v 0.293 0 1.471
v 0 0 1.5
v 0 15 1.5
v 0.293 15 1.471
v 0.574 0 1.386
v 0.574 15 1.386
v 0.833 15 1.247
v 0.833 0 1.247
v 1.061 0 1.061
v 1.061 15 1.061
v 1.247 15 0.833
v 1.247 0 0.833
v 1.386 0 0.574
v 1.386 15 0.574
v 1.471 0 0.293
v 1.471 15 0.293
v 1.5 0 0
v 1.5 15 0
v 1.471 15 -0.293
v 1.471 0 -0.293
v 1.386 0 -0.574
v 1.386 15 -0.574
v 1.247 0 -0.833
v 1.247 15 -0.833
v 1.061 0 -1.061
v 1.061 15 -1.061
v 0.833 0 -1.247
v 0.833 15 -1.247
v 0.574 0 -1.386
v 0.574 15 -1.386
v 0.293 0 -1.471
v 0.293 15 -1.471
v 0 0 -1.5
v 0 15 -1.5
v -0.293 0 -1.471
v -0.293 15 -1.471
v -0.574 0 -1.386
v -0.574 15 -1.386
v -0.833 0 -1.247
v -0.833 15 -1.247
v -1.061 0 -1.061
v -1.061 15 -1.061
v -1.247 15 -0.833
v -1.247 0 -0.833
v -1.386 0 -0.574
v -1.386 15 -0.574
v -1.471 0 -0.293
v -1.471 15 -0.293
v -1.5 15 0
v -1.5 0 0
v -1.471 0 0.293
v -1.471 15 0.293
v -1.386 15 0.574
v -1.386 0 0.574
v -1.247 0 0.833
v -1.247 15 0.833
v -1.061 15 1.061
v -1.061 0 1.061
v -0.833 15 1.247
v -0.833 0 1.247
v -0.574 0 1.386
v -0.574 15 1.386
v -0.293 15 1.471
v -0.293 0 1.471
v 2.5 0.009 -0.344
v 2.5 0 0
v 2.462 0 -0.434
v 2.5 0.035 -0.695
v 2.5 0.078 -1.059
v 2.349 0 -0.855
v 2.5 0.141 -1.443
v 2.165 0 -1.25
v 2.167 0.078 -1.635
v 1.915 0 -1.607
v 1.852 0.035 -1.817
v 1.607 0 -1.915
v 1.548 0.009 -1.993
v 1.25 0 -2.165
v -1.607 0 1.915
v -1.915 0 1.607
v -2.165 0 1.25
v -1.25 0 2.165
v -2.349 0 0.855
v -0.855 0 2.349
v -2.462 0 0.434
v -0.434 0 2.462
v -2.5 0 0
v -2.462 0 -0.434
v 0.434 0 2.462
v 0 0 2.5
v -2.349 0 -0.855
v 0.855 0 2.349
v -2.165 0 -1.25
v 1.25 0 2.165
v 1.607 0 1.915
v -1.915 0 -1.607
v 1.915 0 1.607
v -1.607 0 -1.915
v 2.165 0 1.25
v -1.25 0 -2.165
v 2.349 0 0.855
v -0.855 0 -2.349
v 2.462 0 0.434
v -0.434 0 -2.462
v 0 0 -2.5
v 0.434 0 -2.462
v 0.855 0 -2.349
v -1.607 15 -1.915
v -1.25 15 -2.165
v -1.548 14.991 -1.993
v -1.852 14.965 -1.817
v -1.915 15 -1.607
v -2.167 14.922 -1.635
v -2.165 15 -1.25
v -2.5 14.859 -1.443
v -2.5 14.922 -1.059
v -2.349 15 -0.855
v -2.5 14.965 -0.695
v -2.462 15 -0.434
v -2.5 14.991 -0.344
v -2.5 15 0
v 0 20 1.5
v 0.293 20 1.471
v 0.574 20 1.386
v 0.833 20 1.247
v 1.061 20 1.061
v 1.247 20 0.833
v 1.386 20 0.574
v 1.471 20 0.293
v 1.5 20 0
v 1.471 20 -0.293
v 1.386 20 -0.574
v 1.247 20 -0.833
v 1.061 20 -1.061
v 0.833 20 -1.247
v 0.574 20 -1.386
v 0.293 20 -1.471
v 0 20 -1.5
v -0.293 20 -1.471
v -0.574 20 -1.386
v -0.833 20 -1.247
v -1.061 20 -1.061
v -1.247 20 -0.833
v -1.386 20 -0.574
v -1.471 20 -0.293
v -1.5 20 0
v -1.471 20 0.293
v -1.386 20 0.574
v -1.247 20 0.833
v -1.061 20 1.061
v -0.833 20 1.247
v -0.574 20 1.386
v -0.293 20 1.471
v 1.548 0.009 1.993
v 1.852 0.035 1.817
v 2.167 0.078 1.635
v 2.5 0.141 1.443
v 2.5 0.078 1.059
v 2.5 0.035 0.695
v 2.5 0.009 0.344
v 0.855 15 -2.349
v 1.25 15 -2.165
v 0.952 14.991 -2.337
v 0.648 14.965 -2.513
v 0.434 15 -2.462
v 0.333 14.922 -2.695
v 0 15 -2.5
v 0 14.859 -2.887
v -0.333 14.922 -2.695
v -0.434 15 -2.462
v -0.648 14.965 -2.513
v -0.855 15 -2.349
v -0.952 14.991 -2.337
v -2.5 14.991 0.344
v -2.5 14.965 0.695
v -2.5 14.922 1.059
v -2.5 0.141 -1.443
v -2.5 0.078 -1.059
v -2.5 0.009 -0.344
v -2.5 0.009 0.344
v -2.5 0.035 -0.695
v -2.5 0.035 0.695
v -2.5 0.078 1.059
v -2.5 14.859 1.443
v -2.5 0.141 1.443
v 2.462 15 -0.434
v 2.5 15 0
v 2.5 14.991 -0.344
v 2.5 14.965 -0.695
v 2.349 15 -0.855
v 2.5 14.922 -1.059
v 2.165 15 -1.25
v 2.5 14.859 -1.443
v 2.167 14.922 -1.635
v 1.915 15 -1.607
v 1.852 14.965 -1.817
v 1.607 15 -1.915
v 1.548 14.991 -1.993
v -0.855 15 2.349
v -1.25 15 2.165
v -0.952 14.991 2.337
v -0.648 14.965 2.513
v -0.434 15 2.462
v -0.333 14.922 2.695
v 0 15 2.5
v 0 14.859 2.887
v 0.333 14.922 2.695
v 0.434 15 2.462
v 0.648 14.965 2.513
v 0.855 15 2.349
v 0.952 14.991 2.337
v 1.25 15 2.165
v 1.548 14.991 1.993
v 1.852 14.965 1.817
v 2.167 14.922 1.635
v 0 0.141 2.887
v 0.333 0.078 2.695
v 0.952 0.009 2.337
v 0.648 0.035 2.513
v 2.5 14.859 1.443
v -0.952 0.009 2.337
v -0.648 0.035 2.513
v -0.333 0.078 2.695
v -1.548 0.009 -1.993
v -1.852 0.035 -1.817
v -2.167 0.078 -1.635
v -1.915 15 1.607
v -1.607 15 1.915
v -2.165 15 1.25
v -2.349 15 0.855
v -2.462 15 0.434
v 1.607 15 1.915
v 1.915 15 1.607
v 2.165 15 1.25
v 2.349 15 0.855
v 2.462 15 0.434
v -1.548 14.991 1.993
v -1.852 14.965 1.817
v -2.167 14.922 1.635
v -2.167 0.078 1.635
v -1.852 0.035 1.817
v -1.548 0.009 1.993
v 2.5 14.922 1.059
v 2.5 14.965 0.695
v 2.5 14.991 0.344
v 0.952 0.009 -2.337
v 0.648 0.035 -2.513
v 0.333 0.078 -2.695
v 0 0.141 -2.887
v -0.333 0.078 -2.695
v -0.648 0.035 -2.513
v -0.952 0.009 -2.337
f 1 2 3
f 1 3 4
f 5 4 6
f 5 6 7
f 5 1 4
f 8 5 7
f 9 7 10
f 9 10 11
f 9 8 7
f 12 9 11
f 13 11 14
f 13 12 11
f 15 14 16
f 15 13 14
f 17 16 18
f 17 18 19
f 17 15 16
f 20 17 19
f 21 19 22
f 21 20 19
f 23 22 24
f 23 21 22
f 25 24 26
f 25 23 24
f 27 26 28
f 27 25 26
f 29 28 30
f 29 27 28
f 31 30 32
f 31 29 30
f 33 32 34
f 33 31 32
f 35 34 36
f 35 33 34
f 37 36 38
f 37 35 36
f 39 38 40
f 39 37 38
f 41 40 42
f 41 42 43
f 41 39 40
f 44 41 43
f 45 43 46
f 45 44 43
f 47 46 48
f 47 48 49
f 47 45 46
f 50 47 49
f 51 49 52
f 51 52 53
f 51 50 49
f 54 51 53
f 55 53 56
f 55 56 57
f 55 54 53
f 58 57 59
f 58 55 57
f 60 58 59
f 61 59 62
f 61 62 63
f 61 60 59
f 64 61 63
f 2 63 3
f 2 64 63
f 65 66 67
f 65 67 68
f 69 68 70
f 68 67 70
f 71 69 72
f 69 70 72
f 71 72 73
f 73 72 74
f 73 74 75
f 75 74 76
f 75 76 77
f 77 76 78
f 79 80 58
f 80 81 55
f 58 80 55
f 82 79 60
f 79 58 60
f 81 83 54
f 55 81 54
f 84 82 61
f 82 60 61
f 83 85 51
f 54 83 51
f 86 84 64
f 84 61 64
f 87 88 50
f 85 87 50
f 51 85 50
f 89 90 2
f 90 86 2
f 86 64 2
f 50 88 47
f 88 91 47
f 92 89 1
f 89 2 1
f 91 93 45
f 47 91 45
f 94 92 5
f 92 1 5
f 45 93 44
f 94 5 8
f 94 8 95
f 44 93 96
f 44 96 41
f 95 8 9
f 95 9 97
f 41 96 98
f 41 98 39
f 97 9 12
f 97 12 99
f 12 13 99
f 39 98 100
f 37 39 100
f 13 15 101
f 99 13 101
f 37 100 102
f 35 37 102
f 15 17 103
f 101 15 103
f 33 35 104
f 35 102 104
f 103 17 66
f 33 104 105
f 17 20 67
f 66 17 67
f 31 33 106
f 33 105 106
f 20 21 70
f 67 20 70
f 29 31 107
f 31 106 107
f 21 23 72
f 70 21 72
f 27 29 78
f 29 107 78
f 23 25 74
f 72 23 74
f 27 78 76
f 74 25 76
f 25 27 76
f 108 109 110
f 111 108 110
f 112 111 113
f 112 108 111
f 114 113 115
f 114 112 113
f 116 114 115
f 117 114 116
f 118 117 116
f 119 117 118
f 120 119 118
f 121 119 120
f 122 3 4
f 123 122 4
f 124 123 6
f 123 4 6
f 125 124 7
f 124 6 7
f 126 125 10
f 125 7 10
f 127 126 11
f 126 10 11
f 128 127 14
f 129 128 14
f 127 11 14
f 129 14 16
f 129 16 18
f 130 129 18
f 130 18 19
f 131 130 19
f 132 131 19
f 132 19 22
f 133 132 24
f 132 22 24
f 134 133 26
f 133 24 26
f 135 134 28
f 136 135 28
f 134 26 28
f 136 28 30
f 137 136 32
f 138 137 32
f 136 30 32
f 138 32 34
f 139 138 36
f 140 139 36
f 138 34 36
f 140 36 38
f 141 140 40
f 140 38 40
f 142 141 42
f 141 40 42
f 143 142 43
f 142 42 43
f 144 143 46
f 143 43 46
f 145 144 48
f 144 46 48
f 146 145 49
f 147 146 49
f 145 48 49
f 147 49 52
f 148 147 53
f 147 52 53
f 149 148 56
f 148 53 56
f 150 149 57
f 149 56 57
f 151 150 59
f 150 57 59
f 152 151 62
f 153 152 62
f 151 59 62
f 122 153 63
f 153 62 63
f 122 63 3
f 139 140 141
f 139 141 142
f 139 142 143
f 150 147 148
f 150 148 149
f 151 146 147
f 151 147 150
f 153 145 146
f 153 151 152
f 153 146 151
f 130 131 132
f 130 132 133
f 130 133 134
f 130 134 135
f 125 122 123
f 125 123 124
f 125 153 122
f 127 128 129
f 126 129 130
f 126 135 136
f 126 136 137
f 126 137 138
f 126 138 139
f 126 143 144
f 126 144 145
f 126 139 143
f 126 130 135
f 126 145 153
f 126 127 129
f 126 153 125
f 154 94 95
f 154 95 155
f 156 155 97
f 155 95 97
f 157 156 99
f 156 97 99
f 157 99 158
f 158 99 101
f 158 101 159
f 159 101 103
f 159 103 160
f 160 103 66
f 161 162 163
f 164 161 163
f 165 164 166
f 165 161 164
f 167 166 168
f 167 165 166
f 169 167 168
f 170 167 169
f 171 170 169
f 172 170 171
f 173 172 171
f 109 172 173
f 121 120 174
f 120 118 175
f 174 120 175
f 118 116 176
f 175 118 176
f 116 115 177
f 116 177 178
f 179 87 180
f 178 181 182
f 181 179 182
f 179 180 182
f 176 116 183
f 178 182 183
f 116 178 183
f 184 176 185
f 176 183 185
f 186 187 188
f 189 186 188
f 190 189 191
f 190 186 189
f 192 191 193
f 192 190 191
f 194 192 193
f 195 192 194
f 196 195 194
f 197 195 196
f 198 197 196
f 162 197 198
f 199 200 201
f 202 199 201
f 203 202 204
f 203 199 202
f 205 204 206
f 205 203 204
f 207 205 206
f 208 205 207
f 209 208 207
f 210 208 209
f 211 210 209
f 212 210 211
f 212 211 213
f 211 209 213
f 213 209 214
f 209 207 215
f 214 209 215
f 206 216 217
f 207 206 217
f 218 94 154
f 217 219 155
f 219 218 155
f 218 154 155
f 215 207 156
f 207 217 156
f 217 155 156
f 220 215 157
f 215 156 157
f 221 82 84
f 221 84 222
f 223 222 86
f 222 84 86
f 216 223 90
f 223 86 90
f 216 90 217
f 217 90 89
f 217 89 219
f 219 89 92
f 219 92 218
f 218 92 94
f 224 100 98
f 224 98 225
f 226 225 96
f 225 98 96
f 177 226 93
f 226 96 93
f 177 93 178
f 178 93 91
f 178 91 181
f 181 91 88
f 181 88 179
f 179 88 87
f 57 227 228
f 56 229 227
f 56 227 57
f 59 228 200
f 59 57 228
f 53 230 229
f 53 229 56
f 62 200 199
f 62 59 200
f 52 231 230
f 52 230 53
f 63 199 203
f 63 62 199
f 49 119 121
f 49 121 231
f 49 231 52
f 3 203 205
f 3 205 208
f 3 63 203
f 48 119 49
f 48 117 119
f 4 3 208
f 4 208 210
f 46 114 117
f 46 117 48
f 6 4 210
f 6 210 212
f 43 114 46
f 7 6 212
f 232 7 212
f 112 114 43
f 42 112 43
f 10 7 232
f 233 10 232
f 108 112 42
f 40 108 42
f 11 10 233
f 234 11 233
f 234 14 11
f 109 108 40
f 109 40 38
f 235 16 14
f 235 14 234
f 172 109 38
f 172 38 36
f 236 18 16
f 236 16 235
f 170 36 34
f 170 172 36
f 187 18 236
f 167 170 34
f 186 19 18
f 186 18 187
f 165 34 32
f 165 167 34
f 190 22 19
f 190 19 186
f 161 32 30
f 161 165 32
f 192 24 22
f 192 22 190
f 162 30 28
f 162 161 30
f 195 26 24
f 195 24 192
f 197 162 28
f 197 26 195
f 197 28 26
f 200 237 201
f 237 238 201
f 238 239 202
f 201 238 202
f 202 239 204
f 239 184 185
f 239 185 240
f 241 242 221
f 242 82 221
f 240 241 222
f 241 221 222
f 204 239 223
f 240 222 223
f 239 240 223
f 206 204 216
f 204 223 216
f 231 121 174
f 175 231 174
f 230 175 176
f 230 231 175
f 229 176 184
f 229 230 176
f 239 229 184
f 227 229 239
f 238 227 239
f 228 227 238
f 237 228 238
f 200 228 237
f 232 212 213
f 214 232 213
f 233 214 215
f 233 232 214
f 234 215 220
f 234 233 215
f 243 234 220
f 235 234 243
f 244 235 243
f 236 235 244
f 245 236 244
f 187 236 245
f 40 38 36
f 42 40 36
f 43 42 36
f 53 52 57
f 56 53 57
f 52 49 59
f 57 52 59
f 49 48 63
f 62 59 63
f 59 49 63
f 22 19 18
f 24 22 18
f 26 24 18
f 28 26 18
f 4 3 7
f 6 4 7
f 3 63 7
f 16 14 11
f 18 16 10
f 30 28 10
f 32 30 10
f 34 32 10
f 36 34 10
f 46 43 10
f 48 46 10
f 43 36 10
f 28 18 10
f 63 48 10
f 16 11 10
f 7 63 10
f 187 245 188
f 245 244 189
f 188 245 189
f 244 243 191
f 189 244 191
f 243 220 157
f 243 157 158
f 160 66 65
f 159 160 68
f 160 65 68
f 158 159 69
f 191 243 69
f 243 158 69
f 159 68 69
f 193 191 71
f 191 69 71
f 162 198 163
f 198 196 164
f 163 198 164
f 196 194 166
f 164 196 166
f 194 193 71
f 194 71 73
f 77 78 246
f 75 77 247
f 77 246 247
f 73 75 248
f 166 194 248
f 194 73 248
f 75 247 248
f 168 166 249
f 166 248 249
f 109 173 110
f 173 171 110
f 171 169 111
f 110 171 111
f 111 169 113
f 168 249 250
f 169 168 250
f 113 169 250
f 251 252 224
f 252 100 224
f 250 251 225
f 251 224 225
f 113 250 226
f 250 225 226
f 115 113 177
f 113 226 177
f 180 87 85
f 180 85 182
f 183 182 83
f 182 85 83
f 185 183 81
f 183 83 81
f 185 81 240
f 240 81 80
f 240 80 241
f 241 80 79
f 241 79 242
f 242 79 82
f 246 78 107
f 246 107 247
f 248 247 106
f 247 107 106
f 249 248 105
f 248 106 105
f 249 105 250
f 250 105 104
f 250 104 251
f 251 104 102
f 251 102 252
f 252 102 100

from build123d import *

# Parameters (mm, degrees)
SKETCH1_R           = 1.5
BOSS_EXTRUDE1_DEPTH = 15
SKETCH7_R           = 1.5
BOSS_EXTRUDE2_DEPTH = 5


with BuildPart() as part:
    # Sketch1 → Boss-Extrude1 (new body)
    with BuildSketch(Plane(origin=(0, 0, 0), x_dir=(1, 0, 0), z_dir=(0, 1, 0))):
        Polygon((0, 2.886751346), (-2.5, 1.443375673), (-2.5, -1.443375673), (0, -2.886751346), (2.5, -1.443375673), (2.5, 1.443375673), align=None)
        with Locations(Location((0, 0, 0), (0, 0, 270))):
            Circle(SKETCH1_R, mode=Mode.SUBTRACT)
    extrude(amount=BOSS_EXTRUDE1_DEPTH)

    # Sketch6 → Cut-Revolve1 (revolve, cut)
    with BuildSketch(Plane.ZY):
        Polygon((2.5, 15), (2.886751346, 15), (2.886751346, 14.859234022), align=None)
    cut_revolve1 = revolve(axis=Axis((0, 15, 0), (0, 1, 0)), mode=Mode.SUBTRACT)

    # Mirror1: Cut-Revolve1 across plane
    add(cut_revolve1.mirror(Plane.ZX.offset(7.5)), mode=Mode.SUBTRACT)


with BuildPart() as body_2:
    # Sketch7 → Boss-Extrude2 (new body)
    with BuildSketch(Plane(origin=(0, 15, 0), x_dir=(1, 0, 0), z_dir=(0, 1, 0))):
        with Locations(Location((0, 0, 0), (0, 0, 270))):
            Circle(SKETCH7_R)
    extrude(amount=BOSS_EXTRUDE2_DEPTH)


solid = Compound([part.part, body_2.part])
